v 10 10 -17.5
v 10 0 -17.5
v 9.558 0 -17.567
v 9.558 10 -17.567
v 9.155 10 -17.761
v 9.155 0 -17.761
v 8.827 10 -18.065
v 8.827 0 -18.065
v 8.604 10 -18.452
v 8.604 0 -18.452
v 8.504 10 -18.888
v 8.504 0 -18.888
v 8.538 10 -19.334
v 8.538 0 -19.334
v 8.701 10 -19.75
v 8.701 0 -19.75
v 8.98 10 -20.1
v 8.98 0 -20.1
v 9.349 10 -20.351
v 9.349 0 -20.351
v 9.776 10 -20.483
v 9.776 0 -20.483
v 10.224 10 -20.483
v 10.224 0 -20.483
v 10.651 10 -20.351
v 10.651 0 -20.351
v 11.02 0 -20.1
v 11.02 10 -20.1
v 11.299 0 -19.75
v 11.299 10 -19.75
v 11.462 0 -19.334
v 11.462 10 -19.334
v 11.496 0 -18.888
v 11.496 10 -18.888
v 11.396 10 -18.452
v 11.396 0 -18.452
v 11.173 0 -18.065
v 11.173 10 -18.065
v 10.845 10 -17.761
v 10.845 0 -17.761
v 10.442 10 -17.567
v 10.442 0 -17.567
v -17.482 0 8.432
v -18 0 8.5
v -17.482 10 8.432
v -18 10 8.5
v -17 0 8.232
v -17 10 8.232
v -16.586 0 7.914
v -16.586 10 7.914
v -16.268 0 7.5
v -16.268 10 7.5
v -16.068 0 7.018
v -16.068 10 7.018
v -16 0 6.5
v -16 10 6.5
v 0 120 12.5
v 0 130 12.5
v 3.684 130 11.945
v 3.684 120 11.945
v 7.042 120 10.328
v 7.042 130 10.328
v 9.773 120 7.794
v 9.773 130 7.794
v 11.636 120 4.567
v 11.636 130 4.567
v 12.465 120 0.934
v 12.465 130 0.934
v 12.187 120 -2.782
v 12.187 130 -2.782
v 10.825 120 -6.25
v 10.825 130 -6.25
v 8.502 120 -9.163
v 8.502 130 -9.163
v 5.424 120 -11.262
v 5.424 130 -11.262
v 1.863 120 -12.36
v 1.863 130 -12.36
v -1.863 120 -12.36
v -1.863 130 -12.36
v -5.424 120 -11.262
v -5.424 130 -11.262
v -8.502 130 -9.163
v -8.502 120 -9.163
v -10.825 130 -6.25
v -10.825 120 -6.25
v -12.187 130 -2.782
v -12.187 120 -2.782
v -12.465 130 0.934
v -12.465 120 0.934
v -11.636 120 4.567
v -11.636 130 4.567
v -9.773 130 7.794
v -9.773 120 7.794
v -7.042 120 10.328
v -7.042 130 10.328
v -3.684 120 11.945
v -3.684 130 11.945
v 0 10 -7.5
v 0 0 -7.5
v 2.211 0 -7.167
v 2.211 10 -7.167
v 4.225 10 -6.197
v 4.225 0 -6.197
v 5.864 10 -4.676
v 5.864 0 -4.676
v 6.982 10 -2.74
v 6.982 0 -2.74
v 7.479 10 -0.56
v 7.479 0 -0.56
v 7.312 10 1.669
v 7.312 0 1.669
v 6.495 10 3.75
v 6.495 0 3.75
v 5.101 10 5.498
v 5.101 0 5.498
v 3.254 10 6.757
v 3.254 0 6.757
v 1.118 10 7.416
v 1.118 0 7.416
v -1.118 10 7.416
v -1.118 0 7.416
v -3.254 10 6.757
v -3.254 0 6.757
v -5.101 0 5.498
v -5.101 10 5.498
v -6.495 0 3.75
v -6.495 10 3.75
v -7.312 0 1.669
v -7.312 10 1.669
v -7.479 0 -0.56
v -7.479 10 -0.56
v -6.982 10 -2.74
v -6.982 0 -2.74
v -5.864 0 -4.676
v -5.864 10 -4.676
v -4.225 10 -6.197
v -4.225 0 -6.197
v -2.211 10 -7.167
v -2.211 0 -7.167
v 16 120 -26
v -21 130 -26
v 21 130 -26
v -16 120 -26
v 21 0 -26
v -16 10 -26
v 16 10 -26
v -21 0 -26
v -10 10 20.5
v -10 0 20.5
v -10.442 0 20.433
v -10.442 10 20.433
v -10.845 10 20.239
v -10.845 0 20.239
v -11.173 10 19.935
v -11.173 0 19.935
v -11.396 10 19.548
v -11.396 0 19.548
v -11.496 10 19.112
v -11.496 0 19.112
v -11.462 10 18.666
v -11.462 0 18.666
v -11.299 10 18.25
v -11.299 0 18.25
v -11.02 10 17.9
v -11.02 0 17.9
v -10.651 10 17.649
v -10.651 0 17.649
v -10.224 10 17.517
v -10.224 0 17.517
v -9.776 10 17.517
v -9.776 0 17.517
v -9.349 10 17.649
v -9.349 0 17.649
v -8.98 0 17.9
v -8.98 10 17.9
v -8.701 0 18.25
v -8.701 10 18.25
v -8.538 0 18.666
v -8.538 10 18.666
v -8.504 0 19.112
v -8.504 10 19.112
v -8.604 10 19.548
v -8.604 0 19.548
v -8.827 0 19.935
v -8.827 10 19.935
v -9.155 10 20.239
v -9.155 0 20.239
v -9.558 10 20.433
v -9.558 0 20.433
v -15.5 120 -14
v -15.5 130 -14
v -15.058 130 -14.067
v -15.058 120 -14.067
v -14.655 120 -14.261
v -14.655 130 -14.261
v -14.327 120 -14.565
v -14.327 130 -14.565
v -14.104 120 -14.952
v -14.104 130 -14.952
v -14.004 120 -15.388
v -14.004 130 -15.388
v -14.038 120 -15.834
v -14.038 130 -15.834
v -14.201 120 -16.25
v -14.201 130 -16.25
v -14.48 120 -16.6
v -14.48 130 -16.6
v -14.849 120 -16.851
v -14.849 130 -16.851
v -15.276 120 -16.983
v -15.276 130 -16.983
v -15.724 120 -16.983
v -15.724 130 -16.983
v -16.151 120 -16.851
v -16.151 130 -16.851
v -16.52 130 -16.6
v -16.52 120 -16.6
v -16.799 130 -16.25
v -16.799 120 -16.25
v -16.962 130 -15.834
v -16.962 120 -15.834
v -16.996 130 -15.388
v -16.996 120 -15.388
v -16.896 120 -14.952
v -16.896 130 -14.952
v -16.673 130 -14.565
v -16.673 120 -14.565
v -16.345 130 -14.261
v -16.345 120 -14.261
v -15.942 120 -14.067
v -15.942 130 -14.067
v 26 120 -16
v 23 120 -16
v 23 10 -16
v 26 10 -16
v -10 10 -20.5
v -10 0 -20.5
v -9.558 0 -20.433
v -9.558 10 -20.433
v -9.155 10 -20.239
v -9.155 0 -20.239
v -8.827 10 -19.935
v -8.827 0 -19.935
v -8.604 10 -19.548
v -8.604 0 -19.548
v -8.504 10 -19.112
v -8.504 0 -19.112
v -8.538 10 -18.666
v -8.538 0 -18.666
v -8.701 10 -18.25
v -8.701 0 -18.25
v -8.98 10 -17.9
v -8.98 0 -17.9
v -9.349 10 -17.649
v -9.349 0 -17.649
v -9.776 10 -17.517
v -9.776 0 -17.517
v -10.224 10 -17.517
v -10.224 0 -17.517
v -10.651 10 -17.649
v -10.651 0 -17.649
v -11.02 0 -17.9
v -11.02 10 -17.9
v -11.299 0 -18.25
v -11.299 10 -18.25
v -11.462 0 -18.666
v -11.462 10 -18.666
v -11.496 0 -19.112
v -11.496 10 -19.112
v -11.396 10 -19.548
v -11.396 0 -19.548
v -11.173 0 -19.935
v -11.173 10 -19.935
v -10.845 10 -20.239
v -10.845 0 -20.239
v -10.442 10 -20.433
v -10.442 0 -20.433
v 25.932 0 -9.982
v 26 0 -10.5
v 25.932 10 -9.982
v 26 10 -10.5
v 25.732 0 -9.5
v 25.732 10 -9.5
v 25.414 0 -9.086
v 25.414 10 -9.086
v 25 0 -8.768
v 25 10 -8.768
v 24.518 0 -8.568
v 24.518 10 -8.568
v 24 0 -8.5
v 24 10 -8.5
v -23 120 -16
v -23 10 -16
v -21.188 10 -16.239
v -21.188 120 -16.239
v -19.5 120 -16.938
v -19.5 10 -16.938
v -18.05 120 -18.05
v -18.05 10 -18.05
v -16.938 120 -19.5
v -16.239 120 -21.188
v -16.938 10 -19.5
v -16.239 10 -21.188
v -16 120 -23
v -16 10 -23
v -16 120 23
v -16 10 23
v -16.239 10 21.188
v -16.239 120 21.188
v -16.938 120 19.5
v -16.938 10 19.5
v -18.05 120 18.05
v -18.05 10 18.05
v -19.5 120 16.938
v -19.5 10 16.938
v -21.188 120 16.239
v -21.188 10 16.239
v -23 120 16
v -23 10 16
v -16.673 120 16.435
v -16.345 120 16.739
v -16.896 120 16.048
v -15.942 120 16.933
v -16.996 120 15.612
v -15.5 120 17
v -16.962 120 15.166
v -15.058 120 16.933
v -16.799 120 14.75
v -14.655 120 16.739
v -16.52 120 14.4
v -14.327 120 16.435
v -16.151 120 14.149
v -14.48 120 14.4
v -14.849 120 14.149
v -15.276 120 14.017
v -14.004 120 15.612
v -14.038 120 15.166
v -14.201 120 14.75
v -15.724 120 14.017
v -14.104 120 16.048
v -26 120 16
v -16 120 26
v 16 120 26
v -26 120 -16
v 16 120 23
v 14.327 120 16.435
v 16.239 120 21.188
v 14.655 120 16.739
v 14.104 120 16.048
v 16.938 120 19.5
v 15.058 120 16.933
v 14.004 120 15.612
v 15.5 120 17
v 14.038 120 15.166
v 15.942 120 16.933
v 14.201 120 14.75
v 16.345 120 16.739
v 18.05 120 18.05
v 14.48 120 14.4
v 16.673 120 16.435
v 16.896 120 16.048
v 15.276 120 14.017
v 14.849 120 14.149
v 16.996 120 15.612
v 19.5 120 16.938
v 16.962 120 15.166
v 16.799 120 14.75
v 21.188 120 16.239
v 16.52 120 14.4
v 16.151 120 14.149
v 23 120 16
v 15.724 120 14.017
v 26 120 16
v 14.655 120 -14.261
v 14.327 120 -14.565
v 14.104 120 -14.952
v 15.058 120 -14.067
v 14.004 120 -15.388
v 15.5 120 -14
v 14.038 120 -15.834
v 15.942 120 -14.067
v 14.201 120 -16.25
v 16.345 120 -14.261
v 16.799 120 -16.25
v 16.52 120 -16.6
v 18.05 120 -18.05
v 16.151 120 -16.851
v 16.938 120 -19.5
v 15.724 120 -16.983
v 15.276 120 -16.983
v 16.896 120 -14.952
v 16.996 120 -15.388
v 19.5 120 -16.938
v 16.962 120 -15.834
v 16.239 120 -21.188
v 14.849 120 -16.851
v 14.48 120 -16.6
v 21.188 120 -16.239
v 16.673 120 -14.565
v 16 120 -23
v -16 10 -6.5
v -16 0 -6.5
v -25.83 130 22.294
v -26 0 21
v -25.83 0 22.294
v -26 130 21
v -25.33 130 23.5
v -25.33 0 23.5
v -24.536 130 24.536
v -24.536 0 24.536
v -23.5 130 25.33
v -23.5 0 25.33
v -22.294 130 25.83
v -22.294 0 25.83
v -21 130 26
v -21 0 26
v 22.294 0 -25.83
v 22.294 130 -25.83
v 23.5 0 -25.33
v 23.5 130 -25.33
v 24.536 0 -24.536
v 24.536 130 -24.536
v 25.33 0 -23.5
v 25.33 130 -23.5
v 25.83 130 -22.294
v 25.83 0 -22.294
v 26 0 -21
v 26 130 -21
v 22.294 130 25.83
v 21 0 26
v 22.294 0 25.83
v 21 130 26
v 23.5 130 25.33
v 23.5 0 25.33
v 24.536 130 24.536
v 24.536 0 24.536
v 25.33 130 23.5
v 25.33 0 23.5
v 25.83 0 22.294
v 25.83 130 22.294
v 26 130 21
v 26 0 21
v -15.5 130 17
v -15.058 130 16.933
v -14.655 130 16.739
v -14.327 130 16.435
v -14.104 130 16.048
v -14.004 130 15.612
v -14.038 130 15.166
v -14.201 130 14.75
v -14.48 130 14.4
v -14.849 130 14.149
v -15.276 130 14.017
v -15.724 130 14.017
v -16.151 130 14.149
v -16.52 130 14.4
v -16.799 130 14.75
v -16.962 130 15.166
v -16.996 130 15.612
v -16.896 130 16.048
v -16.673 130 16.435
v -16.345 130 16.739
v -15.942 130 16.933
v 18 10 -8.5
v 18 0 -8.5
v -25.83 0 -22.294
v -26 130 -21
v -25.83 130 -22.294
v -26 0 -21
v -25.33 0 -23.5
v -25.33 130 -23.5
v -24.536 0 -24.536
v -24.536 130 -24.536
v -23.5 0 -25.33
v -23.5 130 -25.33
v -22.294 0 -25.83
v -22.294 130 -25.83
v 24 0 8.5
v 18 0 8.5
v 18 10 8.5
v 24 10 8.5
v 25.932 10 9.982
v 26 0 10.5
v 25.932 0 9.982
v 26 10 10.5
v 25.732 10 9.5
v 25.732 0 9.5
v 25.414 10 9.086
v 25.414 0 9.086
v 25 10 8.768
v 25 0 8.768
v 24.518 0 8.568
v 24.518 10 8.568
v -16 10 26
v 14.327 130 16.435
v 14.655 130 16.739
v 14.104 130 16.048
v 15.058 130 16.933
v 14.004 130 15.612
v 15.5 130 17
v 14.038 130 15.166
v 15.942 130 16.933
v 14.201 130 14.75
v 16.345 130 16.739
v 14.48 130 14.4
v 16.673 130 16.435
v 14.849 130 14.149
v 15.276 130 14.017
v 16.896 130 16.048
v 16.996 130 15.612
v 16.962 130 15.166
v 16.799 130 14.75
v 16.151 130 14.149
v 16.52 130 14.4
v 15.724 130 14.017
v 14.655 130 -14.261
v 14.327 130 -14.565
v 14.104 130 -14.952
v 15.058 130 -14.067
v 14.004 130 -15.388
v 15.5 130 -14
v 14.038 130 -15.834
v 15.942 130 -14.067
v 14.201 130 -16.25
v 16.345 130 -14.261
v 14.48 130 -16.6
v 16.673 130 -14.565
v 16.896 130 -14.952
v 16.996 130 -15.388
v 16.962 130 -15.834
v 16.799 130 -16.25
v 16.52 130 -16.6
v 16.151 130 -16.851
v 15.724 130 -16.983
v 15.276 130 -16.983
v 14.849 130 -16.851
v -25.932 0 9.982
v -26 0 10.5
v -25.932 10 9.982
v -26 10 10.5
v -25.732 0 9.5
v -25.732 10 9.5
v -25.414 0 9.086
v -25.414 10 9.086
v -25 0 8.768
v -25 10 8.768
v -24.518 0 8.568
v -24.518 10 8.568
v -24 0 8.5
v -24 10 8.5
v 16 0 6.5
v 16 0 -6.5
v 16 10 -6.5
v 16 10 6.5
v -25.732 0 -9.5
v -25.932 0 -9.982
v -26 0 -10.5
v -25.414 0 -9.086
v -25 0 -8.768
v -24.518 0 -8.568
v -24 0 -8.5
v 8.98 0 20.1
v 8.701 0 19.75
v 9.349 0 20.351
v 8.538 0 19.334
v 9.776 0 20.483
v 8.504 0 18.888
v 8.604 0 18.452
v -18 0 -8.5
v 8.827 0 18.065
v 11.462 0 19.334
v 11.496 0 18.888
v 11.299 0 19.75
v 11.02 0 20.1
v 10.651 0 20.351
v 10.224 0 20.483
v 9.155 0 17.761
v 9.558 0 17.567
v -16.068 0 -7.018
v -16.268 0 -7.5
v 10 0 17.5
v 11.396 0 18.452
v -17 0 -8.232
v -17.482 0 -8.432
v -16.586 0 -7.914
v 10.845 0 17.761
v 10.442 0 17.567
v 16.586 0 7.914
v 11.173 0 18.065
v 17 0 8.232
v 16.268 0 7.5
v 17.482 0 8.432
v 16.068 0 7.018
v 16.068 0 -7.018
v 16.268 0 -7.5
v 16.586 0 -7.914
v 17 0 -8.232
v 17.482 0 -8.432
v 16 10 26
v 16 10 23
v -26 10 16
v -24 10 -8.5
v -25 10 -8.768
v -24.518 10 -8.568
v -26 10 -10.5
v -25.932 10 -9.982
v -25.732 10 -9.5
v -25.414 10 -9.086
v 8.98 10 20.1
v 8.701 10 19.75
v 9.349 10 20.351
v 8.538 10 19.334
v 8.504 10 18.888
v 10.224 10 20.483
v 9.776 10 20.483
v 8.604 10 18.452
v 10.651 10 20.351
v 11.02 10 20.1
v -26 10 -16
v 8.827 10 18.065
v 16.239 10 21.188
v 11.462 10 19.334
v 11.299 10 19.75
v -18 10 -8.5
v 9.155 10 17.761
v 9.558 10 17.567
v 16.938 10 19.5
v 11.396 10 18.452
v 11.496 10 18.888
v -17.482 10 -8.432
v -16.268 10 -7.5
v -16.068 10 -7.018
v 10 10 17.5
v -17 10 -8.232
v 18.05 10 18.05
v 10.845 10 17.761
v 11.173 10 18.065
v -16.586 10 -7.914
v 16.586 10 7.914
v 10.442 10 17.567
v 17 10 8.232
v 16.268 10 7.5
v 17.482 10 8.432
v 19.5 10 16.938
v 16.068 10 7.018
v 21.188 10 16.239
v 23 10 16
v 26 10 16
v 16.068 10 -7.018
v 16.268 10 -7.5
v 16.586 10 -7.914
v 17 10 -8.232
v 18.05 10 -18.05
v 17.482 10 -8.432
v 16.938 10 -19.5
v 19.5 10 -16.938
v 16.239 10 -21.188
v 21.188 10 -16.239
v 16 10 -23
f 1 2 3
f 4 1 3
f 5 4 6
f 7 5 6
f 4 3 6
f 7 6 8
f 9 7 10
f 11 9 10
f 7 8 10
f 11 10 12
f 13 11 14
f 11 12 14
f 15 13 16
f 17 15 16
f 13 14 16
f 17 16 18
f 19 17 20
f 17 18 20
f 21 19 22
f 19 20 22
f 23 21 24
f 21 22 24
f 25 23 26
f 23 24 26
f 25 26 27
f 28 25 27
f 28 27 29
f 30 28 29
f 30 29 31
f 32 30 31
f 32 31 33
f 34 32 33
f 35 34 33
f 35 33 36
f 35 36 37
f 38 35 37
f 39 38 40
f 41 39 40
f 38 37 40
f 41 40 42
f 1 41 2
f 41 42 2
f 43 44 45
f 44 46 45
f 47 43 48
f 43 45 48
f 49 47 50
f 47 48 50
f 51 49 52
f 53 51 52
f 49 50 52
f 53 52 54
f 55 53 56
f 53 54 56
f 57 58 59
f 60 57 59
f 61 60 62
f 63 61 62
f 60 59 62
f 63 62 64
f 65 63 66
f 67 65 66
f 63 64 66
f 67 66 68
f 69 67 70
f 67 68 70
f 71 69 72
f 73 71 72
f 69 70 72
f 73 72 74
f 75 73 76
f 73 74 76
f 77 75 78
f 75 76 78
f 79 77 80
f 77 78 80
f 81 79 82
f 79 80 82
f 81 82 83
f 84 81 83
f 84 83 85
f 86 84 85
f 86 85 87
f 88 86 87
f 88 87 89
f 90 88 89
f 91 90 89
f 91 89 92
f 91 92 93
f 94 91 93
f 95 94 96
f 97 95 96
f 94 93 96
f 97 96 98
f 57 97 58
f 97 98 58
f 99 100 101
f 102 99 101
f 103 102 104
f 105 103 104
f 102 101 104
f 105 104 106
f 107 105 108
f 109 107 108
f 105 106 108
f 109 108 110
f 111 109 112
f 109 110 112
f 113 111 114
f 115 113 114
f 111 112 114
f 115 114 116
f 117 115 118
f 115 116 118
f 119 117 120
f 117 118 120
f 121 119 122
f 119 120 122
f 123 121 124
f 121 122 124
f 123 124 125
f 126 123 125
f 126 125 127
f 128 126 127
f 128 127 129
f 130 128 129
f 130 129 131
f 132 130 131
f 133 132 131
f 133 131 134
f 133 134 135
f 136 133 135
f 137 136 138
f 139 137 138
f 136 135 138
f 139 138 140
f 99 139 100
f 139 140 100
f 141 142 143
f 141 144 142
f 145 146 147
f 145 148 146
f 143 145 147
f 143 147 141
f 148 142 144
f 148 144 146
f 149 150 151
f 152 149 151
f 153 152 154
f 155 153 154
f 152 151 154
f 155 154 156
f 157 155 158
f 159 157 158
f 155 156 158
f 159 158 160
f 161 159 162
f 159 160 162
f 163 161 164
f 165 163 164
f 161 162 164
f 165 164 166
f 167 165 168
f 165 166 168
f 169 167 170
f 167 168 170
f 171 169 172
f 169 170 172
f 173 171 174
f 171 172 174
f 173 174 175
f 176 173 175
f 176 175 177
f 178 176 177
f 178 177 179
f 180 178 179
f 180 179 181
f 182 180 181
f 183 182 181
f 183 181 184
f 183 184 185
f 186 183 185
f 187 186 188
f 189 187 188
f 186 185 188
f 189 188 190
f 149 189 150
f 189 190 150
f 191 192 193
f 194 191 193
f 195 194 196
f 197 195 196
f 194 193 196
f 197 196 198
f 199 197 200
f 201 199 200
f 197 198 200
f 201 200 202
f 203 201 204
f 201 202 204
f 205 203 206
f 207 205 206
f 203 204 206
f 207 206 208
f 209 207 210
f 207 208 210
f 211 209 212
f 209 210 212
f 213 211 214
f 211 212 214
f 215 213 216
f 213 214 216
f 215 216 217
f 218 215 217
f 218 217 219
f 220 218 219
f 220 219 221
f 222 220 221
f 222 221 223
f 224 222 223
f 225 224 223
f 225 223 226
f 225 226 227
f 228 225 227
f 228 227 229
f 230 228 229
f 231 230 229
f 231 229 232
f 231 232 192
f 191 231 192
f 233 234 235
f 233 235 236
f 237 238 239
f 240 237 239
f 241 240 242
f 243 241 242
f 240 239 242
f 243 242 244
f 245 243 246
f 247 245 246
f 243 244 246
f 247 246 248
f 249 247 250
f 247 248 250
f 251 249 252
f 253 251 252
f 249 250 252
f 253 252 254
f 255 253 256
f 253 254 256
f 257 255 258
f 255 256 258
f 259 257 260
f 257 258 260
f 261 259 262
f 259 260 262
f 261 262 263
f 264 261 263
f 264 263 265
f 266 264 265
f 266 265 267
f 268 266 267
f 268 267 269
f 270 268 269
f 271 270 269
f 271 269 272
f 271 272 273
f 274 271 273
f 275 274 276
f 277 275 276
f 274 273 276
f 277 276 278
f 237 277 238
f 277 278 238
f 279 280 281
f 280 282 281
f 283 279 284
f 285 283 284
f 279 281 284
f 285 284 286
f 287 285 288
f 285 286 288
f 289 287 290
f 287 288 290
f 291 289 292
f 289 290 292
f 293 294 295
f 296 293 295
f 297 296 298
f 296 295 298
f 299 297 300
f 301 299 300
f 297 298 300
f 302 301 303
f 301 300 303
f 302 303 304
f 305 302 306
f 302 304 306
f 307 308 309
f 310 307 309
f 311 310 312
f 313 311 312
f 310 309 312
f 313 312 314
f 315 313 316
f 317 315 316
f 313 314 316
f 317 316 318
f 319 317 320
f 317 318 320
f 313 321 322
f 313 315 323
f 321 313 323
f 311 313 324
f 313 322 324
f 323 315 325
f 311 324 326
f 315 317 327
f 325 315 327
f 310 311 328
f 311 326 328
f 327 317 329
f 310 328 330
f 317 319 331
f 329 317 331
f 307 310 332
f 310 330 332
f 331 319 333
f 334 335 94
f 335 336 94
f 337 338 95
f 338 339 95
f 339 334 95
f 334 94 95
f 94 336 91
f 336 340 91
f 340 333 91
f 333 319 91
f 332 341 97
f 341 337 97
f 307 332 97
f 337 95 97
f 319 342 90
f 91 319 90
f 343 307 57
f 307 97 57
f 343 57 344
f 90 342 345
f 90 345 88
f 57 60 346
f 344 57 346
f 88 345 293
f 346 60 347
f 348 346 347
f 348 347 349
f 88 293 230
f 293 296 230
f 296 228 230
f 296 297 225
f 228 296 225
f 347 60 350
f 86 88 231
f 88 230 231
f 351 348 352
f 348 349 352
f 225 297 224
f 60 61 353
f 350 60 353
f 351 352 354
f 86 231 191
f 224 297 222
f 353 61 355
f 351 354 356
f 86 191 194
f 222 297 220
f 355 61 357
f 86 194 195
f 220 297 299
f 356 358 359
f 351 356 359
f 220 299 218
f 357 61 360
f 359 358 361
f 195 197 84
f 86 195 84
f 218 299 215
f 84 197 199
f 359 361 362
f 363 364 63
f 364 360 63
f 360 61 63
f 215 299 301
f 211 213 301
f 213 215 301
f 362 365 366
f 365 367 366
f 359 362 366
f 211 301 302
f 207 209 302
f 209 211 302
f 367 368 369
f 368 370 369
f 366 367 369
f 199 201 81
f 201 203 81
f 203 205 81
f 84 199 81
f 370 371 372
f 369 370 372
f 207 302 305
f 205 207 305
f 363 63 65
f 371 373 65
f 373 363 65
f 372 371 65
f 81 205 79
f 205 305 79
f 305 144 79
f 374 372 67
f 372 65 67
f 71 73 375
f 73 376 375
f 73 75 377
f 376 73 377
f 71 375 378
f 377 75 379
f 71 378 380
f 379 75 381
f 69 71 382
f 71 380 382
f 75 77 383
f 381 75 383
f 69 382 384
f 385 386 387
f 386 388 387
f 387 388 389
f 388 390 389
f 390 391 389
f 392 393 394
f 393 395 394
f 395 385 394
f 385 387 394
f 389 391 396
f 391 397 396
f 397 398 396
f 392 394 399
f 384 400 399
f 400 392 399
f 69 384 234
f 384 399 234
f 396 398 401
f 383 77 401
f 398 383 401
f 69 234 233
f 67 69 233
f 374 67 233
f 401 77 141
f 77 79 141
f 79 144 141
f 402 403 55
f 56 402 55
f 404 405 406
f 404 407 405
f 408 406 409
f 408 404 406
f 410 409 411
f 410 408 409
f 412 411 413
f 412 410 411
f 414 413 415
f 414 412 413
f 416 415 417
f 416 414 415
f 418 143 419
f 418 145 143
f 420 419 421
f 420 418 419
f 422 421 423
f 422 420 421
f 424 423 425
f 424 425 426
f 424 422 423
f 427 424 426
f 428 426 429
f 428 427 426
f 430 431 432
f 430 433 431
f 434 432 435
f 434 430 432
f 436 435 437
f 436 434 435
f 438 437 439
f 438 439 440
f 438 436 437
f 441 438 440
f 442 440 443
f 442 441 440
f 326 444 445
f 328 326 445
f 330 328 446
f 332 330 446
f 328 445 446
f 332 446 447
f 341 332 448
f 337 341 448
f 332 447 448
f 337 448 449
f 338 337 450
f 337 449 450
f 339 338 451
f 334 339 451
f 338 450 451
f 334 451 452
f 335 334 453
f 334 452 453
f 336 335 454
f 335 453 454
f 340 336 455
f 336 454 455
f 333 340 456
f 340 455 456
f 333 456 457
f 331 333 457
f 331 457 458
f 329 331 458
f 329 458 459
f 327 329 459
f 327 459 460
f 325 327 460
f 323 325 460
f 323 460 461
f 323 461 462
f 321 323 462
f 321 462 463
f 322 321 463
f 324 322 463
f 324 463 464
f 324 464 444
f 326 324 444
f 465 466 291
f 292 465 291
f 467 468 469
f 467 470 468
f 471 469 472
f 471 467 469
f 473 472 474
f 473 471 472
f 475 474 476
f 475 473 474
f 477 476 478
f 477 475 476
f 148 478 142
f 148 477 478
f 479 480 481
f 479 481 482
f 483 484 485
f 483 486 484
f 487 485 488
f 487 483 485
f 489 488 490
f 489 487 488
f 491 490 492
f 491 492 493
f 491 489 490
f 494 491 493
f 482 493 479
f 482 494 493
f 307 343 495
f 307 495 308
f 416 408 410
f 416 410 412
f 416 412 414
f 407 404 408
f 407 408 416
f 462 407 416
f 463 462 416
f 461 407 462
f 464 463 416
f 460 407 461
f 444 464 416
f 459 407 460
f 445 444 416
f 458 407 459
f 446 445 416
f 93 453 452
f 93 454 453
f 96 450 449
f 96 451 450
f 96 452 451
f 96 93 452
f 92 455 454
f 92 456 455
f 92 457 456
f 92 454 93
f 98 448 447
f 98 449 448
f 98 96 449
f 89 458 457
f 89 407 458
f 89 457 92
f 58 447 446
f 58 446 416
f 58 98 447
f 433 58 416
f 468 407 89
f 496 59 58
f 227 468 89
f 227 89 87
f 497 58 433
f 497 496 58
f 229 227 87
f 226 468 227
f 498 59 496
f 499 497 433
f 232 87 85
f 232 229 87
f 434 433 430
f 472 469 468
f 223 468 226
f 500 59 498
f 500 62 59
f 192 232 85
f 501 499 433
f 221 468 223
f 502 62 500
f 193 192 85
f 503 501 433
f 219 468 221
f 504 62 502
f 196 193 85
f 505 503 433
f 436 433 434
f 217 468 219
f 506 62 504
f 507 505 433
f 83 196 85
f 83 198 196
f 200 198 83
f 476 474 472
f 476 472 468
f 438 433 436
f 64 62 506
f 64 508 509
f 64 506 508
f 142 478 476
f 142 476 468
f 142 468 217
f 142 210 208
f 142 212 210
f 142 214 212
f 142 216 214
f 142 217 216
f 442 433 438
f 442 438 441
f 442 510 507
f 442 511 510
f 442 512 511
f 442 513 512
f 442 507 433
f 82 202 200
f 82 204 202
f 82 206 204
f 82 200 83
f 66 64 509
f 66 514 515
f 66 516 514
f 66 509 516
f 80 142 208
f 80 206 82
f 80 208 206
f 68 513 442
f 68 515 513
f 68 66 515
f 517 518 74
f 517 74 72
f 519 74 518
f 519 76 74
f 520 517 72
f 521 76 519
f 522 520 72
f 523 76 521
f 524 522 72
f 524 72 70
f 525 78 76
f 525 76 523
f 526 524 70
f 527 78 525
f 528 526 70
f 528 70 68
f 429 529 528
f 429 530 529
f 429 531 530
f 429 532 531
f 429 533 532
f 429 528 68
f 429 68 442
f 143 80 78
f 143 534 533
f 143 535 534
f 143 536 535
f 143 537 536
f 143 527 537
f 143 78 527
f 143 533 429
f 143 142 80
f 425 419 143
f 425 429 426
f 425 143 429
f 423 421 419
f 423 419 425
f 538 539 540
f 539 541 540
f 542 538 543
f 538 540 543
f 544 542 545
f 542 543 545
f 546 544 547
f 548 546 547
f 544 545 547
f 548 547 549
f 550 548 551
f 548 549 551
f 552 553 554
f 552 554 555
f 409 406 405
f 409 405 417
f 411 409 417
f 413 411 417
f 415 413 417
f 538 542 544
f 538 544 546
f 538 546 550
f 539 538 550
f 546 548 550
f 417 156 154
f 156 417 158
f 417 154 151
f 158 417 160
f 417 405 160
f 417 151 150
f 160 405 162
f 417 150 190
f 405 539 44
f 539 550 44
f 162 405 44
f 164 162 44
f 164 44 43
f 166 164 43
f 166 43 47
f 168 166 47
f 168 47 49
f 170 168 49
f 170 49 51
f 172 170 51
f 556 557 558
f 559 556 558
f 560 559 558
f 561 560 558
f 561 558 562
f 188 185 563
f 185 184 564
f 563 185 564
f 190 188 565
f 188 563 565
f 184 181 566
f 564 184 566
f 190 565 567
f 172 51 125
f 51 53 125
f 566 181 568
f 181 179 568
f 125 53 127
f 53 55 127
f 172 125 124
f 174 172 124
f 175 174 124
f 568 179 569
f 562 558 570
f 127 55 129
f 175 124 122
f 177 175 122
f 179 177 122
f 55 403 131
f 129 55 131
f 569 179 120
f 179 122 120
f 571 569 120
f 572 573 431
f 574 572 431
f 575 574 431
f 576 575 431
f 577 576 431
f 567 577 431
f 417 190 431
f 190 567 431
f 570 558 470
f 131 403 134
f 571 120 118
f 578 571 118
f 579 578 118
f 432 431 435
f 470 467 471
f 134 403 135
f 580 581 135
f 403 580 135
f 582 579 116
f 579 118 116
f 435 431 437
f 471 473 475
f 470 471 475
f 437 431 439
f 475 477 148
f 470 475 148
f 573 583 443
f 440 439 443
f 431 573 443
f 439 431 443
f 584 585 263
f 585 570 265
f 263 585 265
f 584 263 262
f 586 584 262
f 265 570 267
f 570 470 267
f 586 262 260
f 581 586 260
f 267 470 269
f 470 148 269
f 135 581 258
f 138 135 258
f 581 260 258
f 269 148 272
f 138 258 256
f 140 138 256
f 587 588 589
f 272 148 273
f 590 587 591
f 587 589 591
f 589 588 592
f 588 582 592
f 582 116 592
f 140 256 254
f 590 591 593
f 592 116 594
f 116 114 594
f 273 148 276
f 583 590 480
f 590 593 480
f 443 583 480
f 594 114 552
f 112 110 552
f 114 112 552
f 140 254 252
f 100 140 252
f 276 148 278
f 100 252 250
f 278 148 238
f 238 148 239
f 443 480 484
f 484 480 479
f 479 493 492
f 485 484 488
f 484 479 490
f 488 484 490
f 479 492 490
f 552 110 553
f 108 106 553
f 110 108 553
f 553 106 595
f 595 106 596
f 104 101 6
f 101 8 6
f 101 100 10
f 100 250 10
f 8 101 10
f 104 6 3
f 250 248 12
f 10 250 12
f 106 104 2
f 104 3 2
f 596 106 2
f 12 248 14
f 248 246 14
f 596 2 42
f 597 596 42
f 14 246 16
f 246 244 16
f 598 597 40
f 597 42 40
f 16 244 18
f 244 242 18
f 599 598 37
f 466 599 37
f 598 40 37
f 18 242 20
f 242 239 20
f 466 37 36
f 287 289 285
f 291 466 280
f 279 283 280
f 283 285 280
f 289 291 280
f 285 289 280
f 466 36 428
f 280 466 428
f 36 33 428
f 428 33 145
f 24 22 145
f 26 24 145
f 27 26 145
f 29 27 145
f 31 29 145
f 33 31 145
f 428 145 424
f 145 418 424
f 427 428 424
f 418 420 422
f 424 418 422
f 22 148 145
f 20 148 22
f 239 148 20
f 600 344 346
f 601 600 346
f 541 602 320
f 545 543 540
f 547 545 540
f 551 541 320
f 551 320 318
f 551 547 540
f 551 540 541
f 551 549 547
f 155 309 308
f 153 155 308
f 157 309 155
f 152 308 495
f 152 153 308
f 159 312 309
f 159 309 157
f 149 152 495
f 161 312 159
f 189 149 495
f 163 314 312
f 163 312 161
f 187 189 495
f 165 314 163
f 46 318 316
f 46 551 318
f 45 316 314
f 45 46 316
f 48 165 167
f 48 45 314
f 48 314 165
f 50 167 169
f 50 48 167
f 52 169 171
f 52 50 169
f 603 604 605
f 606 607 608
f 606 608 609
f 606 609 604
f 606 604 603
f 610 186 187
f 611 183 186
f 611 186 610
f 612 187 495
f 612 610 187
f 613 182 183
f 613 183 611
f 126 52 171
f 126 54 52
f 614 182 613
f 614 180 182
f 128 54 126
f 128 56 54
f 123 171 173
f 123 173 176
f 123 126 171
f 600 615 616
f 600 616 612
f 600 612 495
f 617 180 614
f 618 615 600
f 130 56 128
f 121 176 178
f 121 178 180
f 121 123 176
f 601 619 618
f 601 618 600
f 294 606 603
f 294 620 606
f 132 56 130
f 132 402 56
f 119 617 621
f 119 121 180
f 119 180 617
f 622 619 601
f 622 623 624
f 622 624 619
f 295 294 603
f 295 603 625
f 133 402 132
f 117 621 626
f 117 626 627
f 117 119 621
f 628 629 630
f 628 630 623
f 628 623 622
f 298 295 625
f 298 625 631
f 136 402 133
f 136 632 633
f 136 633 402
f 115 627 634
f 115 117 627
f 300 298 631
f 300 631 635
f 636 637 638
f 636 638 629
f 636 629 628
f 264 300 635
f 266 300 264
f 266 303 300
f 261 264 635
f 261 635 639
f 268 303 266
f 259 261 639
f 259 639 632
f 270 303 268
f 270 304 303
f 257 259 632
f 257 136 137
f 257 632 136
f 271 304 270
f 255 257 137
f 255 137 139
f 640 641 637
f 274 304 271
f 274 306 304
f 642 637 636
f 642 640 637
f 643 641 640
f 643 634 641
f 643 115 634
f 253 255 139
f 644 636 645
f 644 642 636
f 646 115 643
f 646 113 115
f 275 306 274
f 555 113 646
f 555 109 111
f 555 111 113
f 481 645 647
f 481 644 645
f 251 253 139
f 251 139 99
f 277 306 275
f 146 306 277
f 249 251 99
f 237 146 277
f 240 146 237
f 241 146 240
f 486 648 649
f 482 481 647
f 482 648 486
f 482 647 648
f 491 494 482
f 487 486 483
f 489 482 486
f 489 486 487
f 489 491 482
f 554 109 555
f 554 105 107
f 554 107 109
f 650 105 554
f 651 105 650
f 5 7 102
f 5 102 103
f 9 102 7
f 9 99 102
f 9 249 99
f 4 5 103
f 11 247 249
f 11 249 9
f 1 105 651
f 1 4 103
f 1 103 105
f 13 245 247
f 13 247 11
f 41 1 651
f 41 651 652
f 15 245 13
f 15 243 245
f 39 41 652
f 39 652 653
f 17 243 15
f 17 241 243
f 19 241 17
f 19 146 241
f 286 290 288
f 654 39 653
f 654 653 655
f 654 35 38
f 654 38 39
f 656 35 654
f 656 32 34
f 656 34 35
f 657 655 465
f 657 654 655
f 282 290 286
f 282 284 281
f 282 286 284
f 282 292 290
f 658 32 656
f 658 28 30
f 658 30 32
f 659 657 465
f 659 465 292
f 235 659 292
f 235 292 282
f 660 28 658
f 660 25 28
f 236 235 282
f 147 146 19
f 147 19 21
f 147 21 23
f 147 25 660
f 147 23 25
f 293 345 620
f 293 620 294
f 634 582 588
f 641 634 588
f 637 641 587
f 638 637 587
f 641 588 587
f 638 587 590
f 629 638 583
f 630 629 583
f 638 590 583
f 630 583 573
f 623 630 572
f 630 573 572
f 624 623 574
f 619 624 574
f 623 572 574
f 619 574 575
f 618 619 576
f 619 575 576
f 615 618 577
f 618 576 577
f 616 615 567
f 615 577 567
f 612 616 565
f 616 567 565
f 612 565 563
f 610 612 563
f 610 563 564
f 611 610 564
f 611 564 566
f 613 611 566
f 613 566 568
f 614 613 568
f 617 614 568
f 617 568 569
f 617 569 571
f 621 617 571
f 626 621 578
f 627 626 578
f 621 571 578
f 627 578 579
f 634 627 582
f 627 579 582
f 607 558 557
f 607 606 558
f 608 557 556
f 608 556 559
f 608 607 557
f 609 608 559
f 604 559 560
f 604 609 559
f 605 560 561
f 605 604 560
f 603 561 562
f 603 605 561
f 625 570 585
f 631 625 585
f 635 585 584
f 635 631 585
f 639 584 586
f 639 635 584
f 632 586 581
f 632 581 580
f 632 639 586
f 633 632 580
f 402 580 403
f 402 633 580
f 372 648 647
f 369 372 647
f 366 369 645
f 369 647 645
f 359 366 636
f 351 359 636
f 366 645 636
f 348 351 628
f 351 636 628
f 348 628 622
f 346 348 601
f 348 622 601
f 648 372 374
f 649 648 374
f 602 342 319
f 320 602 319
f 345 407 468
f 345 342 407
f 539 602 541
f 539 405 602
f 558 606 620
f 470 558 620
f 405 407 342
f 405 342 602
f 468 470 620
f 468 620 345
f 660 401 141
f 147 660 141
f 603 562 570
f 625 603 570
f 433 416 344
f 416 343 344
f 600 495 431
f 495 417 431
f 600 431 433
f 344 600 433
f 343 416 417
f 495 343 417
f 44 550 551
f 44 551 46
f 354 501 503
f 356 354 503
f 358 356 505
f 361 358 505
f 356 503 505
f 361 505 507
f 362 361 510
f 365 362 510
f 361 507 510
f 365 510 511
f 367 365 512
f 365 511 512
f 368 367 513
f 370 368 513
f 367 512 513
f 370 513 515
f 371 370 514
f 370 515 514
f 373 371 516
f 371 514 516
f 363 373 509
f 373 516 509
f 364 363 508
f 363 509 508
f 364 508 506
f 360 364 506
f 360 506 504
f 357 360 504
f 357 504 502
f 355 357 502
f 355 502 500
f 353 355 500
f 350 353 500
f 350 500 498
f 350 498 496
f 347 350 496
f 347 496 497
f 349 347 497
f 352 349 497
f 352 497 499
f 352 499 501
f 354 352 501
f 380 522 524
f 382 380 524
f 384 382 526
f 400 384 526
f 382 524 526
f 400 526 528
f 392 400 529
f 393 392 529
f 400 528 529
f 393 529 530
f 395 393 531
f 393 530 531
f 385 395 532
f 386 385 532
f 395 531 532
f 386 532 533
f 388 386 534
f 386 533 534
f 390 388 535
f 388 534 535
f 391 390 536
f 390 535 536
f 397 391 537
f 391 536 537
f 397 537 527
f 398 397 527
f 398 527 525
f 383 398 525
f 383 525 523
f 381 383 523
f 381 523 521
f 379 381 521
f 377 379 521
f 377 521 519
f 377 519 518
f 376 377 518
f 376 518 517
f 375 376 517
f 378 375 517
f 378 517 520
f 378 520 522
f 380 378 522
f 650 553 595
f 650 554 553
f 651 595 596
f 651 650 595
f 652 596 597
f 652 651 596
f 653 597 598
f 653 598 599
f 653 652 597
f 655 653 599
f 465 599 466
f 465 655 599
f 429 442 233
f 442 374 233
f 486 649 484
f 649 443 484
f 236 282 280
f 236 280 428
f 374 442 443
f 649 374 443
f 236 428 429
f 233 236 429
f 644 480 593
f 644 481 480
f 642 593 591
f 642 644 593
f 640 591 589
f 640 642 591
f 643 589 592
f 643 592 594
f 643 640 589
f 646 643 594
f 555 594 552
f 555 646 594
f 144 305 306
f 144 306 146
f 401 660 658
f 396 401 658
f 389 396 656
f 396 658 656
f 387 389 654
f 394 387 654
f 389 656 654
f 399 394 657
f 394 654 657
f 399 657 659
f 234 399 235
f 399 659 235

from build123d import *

# Parameters (mm, degrees)
SKETCH1_W           = 52
SKETCH1_H           = 52
BOSS_EXTRUDE1_DEPTH = 10
SKETCH2_W           = 10
SKETCH2_H           = 10
BOSS_EXTRUDE2_DEPTH = 110
SKETCH3_W           = 52
SKETCH3_H           = 52
BOSS_EXTRUDE3_DEPTH = 10
SKETCH4_R           = 12.5
CUT_EXTRUDE1_DEPTH  = 10
SKETCH5_R           = 7.5
CUT_EXTRUDE2_DEPTH  = 10
SKETCH6_W           = 10
SKETCH6_H           = 17
CUT_EXTRUDE3_DEPTH  = 10
SKETCH7_R           = 1.5
CUT_EXTRUDE4_DEPTH  = 10
FILLET1_R           = 5
FILLET2_R           = 2
SKETCH8_R           = 1.5
CUT_EXTRUDE6_DEPTH  = 10
FILLET4_R           = 7


with BuildPart() as part:
    # Sketch1 → Boss-Extrude1 (new body)
    with BuildSketch(Plane(origin=(0, 0, 0), x_dir=(1, 0, 0), z_dir=(0, 1, 0))):
        Rectangle(SKETCH1_W, SKETCH1_H)
    extrude(amount=BOSS_EXTRUDE1_DEPTH)

    # Sketch2 → Boss-Extrude2 (add)
    with BuildSketch(Plane(origin=(0, 10, 0), x_dir=(1, 0, 0), z_dir=(0, 1, 0))):
        with Locations((-21, 21)):
            Rectangle(SKETCH2_W, SKETCH2_H)
        with Locations((21, 21)):
            Rectangle(SKETCH2_W, SKETCH2_H)
        with Locations((-21, -21)):
            Rectangle(SKETCH2_W, SKETCH2_H)
        with Locations((21, -21)):
            Rectangle(SKETCH2_W, SKETCH2_H)
    extrude(amount=BOSS_EXTRUDE2_DEPTH)

    # Sketch3 → Boss-Extrude3 (add)
    with BuildSketch(Plane(origin=(0, 120, 0), x_dir=(1, 0, 0), z_dir=(0, 1, 0))):
        Rectangle(SKETCH3_W, SKETCH3_H)
    extrude(amount=BOSS_EXTRUDE3_DEPTH)

    # Sketch4 → Cut-Extrude1 (cut)
    with BuildSketch(Plane(origin=(0, 130, 0), x_dir=(1, 0, 0), z_dir=(0, 1, 0))):
        with Locations(Location((0, 0, 0), (0, 0, 270))):
            Circle(SKETCH4_R)
    extrude(amount=-CUT_EXTRUDE1_DEPTH, mode=Mode.SUBTRACT)

    # Sketch5 → Cut-Extrude2 (cut)
    with BuildSketch(Plane.XZ):
        with Locations(Location((0, 0, 0), (0, 0, 270))):
            Circle(SKETCH5_R)
    extrude(amount=-CUT_EXTRUDE2_DEPTH, mode=Mode.SUBTRACT)

    # Sketch6 → Cut-Extrude3 (cut)
    with BuildSketch(Plane.XZ):
        with Locations((-21, 0)):
            Rectangle(SKETCH6_W, SKETCH6_H)
        with Locations((21, 0)):
            Rectangle(SKETCH6_W, SKETCH6_H)
    extrude(amount=-CUT_EXTRUDE3_DEPTH, mode=Mode.SUBTRACT)

    # Sketch7 → Cut-Extrude4 (cut)
    with BuildSketch(Plane.XZ):
        with Locations(Location((10, 19, 0), (0, 0, 270))):
            Circle(SKETCH7_R)
        with Locations(Location((-10, 19, 0), (0, 0, 90))):
            Circle(SKETCH7_R)
        with Locations(Location((10, -19, 0), (0, 0, 90))):
            Circle(SKETCH7_R)
        with Locations(Location((-10, -19, 0), (0, 0, 270))):
            Circle(SKETCH7_R)
    extrude(amount=-CUT_EXTRUDE4_DEPTH, mode=Mode.SUBTRACT)

    # Fillet1
    fillet1_edges = [part.edges().sort_by_distance(p)[0] for p in [
        (26, 65, 26),
        (-26, 65, 26),
        (-26, 65, -26),
        (26, 65, -26),
    ]]
    fillet(fillet1_edges, radius=FILLET1_R)

    # Fillet2
    fillet2_edges = [part.edges().sort_by_distance(p)[0] for p in [
        (-16, 5, -8.5),
        (-16, 5, 8.5),
        (-26, 5, 8.5),
        (-26, 5, -8.5),
        (16, 5, 8.5),
        (16, 5, -8.5),
        (26, 5, -8.5),
        (26, 5, 8.5),
    ]]
    fillet(fillet2_edges, radius=FILLET2_R)

    # Sketch8 → Cut-Extrude6 (cut)
    with BuildSketch(Plane(origin=(0, 130, 0), x_dir=(1, 0, 0), z_dir=(0, 1, 0))):
        with Locations(Location((-15.5, -15.5, 0), (0, 0, 270))):
            Circle(SKETCH8_R)
        with Locations(Location((-15.5, 15.5, 0), (0, 0, 270))):
            Circle(SKETCH8_R)
        with Locations(Location((15.5, 15.5, 0), (0, 0, 270))):
            Circle(SKETCH8_R)
        with Locations(Location((15.5, -15.5, 0), (0, 0, 270))):
            Circle(SKETCH8_R)
    extrude(amount=-CUT_EXTRUDE6_DEPTH, mode=Mode.SUBTRACT)

    # Fillet4
    # the kernel refuses this fillet: 7 mm, written as the material it takes off along each edge
    with BuildSketch(Plane(origin=(-16, 10, -16), x_dir=(-1, 0, 0), z_dir=(0, 1, 0)), Plane(origin=(16, 10, -16), x_dir=(0, 0, -1), z_dir=(0, 1, 0)), Plane(origin=(16, 10, 16), x_dir=(1, 0, 0), z_dir=(0, 1, 0))) as fillet4_piece_1:
        with BuildLine():
            CenterArc((FILLET4_R, -FILLET4_R), FILLET4_R, 90, 90)
            Line((0, -FILLET4_R), (0, 0))
            Line((0, 0), (FILLET4_R, 0))
        make_face()
    extrude(amount=110, mode=Mode.SUBTRACT)
    with BuildSketch(Plane(origin=(-16, 10, 16), x_dir=(-1, 0, 0), z_dir=(0, 1, 0))) as fillet4_piece_2:
        with BuildLine():
            CenterArc((FILLET4_R, FILLET4_R), FILLET4_R, 180, 90)
            Line((0, FILLET4_R), (0, 0))
            Line((0, 0), (FILLET4_R, 0))
        make_face()
    extrude(amount=110, mode=Mode.SUBTRACT)


solid = part.part
